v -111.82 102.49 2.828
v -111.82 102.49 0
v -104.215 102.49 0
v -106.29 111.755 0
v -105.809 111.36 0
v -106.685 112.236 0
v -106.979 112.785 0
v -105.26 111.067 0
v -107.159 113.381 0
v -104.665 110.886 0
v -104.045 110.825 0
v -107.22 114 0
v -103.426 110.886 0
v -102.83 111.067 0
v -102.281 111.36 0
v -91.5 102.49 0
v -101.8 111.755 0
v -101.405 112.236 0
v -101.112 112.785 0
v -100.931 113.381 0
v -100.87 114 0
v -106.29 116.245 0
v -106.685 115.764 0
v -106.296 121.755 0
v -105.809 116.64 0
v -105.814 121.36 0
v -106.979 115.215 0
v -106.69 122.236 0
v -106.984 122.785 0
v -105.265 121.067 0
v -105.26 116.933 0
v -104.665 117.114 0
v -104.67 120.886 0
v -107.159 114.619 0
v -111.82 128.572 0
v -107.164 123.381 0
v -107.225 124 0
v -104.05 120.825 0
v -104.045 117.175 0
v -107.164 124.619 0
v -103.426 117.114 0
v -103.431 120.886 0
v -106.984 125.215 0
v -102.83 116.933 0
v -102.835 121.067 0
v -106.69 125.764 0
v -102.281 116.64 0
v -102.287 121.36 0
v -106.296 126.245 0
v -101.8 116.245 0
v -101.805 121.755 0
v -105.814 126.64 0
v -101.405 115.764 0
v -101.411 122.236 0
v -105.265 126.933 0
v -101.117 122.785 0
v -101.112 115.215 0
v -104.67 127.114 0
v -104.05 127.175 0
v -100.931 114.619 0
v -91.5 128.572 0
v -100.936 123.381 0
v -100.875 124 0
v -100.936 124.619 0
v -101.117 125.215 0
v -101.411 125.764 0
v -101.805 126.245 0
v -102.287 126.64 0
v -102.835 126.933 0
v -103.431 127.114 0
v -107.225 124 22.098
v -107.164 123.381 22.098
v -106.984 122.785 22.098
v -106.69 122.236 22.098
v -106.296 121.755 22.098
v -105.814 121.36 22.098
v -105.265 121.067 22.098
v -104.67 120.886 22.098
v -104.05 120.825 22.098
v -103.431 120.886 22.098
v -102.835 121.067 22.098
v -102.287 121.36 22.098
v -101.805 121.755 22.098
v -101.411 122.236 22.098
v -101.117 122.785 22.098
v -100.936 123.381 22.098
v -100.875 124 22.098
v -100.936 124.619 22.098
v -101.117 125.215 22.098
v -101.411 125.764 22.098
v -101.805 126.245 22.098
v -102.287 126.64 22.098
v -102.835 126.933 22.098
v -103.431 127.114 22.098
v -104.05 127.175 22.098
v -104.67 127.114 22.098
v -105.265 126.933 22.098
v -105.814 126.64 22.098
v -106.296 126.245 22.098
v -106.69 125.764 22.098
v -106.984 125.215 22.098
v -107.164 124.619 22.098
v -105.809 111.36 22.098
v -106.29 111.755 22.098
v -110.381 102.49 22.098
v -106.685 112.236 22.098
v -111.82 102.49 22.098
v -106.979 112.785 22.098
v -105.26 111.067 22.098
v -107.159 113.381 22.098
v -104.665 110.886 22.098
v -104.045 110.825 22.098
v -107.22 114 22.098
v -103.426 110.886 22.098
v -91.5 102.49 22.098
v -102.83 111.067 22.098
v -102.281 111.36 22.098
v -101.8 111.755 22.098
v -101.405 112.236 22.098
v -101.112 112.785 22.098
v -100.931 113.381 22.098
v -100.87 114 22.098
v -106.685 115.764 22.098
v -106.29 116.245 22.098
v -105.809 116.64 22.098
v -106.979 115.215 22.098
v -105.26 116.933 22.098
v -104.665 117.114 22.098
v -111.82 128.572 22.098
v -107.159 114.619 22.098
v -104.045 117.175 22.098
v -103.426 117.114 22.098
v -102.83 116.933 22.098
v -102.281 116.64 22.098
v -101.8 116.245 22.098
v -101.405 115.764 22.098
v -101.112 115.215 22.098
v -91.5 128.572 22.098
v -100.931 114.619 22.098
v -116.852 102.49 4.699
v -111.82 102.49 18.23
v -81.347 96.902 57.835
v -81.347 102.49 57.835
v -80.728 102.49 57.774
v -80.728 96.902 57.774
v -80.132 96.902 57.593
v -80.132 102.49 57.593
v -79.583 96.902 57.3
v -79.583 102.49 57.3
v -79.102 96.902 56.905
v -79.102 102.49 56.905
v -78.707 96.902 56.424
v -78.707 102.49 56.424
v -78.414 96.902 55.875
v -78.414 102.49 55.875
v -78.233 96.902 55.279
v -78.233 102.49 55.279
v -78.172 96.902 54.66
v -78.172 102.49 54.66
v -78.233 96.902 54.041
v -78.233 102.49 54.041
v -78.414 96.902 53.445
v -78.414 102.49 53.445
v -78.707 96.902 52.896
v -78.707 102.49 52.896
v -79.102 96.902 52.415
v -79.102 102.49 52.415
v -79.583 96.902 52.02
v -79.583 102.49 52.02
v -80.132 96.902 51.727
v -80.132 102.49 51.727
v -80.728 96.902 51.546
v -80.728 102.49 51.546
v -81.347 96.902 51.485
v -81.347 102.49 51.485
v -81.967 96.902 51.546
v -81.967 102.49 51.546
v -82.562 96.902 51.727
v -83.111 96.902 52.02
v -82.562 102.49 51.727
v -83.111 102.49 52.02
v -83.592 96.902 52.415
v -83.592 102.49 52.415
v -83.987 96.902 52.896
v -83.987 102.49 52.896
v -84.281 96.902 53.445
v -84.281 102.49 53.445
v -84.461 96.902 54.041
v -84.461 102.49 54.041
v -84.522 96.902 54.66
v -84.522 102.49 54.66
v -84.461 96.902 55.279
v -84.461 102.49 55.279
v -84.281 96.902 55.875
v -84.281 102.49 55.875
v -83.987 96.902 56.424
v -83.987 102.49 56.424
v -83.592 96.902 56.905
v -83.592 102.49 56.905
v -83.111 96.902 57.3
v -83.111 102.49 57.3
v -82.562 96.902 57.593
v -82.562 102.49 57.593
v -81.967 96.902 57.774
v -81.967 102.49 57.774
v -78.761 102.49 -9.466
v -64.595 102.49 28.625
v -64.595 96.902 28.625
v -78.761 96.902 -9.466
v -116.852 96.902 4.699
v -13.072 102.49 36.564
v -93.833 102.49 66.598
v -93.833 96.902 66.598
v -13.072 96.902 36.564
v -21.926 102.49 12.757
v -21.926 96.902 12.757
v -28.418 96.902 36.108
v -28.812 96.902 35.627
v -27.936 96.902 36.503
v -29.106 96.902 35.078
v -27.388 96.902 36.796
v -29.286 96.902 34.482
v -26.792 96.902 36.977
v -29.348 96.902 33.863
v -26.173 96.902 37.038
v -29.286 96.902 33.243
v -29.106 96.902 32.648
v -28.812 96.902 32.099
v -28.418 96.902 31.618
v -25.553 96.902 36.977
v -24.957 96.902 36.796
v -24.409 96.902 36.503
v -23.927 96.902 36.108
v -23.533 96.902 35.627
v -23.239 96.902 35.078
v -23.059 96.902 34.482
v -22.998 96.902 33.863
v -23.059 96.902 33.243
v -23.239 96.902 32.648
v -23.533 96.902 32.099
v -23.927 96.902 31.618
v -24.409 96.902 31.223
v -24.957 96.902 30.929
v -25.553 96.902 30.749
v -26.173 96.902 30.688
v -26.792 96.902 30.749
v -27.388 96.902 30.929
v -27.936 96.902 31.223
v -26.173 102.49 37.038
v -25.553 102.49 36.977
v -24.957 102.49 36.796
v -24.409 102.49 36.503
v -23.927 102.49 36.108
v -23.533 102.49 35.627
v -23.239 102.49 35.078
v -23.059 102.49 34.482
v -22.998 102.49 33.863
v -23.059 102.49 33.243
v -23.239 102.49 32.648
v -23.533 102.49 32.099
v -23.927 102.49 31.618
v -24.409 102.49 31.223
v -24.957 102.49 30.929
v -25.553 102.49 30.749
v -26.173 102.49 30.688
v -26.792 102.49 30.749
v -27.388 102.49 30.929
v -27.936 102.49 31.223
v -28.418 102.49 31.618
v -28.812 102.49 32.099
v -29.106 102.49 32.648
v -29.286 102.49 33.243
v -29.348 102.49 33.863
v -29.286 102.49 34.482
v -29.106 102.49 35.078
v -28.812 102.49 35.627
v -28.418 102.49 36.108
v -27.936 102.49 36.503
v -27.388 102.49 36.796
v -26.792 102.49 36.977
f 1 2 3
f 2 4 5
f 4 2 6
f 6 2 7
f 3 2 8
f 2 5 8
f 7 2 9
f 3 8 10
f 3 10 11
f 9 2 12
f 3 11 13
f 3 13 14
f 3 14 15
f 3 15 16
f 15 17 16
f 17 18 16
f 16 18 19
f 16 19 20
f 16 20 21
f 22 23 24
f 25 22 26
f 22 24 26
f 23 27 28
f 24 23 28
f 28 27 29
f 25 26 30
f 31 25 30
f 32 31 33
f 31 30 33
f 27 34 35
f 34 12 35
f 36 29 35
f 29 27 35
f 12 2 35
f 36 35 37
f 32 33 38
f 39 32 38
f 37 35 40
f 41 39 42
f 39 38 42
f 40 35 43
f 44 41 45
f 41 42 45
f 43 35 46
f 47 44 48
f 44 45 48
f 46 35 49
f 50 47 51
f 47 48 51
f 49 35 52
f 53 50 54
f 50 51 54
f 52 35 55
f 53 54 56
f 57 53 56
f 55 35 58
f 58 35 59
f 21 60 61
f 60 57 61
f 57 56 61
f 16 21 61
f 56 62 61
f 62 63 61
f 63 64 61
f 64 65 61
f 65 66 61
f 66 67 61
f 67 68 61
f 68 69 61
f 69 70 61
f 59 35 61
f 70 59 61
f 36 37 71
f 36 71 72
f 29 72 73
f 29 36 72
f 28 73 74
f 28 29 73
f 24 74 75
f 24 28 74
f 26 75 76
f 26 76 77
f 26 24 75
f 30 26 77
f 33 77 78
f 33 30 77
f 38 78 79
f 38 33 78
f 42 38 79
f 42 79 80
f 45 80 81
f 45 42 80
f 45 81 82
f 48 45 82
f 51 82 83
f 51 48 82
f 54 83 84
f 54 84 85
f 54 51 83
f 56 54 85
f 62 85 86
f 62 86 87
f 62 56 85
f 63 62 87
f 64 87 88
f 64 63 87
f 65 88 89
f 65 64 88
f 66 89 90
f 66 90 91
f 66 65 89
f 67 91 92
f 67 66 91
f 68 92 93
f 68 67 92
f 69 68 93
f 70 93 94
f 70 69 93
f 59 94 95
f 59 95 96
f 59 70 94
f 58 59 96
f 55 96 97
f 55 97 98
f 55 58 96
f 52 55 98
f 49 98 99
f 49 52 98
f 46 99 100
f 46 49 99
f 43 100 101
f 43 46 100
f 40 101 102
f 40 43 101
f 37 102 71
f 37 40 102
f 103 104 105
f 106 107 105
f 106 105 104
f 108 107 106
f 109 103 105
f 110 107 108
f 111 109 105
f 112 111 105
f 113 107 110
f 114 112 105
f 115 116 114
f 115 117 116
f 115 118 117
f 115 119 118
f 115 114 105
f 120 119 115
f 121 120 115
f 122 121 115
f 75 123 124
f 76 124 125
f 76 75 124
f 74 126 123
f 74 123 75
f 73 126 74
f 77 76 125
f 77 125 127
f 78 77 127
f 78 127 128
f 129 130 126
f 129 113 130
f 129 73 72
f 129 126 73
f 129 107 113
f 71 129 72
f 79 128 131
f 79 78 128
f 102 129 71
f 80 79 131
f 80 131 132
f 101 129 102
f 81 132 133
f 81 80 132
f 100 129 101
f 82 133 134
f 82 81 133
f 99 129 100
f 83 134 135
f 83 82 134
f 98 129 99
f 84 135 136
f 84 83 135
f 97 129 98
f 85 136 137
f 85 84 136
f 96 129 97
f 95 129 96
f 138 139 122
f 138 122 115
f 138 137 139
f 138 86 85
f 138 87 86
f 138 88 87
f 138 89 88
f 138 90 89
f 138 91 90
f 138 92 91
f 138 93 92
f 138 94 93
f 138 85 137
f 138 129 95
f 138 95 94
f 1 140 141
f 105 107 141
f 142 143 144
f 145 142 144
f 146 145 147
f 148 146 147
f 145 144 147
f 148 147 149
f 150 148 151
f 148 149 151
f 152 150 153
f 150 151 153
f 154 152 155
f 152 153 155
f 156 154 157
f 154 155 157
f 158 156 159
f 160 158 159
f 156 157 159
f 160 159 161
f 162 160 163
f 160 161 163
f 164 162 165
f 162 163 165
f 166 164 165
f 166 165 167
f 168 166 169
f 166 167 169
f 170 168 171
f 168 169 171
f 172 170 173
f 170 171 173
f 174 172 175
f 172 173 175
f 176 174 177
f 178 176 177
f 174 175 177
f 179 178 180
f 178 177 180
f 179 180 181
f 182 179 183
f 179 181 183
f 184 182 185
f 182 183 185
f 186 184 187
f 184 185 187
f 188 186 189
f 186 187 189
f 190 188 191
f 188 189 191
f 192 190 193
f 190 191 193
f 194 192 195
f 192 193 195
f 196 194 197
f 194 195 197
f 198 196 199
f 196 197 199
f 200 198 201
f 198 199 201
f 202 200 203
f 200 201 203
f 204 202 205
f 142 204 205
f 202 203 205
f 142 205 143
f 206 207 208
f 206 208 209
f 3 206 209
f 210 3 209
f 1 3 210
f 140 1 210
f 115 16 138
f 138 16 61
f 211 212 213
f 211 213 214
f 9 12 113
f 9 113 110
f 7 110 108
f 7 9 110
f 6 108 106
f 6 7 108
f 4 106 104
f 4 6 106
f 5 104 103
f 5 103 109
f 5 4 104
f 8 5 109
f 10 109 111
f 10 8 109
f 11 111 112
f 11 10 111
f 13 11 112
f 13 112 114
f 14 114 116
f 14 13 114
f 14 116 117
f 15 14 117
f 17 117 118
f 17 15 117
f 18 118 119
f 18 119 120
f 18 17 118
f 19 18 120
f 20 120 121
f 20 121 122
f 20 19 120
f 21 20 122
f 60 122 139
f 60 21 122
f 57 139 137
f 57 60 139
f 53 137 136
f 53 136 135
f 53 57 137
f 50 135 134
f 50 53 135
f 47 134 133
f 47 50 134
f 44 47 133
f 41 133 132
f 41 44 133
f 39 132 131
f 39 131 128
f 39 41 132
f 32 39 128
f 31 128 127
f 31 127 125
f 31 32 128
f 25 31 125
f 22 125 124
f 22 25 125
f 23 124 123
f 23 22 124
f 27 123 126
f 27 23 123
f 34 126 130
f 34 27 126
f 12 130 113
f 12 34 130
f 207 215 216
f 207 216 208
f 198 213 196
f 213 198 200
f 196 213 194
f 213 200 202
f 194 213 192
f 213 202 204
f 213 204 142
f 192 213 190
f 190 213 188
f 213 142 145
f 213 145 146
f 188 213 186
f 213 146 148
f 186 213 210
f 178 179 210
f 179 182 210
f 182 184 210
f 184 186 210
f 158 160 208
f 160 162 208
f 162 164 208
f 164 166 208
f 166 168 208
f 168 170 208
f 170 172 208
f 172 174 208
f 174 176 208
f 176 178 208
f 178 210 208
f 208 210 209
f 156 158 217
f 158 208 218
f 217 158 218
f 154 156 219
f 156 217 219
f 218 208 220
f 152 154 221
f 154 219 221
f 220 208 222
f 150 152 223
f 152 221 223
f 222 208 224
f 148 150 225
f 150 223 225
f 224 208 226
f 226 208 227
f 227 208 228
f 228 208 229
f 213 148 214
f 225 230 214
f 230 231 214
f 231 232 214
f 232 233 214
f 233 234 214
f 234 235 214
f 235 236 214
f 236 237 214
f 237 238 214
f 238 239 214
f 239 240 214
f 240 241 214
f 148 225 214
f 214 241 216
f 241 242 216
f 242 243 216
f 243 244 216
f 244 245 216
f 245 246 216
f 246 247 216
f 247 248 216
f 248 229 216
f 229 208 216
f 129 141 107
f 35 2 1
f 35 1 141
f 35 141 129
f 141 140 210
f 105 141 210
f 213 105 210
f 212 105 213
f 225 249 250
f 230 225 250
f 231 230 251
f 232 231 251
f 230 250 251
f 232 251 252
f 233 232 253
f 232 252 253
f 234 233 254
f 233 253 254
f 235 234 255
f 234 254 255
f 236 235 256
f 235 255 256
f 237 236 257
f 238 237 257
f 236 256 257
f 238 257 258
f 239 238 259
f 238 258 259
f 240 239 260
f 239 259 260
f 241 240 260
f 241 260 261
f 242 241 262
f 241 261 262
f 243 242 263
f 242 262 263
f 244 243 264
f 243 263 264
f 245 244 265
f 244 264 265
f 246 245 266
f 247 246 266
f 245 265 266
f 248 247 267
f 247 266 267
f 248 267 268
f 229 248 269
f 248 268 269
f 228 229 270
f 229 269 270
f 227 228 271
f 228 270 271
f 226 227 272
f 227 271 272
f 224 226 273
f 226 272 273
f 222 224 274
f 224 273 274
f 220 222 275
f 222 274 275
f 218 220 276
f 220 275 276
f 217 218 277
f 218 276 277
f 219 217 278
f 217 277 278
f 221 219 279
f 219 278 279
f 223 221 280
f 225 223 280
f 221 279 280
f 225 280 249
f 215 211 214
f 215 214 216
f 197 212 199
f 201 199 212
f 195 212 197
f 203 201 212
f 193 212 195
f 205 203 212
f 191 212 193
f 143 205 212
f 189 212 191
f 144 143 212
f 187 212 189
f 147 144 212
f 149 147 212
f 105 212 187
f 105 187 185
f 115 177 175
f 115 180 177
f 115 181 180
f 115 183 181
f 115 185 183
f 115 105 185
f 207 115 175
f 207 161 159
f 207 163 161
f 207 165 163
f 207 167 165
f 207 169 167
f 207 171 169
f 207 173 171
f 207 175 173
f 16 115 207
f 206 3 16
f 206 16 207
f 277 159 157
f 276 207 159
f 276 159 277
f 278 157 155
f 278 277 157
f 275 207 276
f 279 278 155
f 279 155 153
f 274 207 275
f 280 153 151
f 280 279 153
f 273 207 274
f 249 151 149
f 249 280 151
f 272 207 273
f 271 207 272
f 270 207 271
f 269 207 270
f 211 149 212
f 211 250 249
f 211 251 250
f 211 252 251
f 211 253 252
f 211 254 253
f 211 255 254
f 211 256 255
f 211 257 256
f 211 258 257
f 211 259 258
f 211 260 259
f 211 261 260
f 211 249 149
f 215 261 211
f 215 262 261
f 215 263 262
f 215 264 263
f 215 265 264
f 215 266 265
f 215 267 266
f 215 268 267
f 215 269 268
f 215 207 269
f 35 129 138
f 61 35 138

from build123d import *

# Parameters (mm, degrees)
SKETCH1_W           = 20.32
SKETCH1_H           = 26.081708108
SKETCH1_R           = 3.175
BOSS_EXTRUDE1_DEPTH = 22.098
SKETCH2_R           = 3.175
BOSS_EXTRUDE2_DEPTH = 5.588


with BuildPart() as part:
    # Sketch1 → Boss-Extrude1 (new body)
    with BuildSketch(Plane.XY):
        with Locations((-101.659894533, 115.530854428)):
            Rectangle(SKETCH1_W, SKETCH1_H)
        with Locations(Location((-104.05047074, 124, 0), (0, 0, 180))):
            Circle(SKETCH1_R, mode=Mode.SUBTRACT)
        with Locations(Location((-104.04520642, 114, 0), (0, 0, 180))):
            Circle(SKETCH1_R, mode=Mode.SUBTRACT)
    extrude(amount=BOSS_EXTRUDE1_DEPTH)

    # Sketch2 → Boss-Extrude2 (add)
    with BuildSketch(Plane(origin=(0, 102.490000374, 0), x_dir=(1, 0, 0), z_dir=(0, 1, 0))):
        Polygon((-93.832652136, -66.597718767), (-13.072372895, -36.5640681), (-21.925888481, -12.757025827), (-64.594900087, -28.625051556), (-78.760525025, 9.46621608), (-116.851792661, -4.699408859), align=None)
        with Locations(Location((-81.347326341, -54.659995843, 0), (0, 0, 270))):
            Circle(SKETCH2_R, mode=Mode.SUBTRACT)
        with Locations(Location((-26.172504674, -33.862735355, 0), (0, 0, 270))):
            Circle(SKETCH2_R, mode=Mode.SUBTRACT)
    extrude(amount=-BOSS_EXTRUDE2_DEPTH)


solid = part.part
